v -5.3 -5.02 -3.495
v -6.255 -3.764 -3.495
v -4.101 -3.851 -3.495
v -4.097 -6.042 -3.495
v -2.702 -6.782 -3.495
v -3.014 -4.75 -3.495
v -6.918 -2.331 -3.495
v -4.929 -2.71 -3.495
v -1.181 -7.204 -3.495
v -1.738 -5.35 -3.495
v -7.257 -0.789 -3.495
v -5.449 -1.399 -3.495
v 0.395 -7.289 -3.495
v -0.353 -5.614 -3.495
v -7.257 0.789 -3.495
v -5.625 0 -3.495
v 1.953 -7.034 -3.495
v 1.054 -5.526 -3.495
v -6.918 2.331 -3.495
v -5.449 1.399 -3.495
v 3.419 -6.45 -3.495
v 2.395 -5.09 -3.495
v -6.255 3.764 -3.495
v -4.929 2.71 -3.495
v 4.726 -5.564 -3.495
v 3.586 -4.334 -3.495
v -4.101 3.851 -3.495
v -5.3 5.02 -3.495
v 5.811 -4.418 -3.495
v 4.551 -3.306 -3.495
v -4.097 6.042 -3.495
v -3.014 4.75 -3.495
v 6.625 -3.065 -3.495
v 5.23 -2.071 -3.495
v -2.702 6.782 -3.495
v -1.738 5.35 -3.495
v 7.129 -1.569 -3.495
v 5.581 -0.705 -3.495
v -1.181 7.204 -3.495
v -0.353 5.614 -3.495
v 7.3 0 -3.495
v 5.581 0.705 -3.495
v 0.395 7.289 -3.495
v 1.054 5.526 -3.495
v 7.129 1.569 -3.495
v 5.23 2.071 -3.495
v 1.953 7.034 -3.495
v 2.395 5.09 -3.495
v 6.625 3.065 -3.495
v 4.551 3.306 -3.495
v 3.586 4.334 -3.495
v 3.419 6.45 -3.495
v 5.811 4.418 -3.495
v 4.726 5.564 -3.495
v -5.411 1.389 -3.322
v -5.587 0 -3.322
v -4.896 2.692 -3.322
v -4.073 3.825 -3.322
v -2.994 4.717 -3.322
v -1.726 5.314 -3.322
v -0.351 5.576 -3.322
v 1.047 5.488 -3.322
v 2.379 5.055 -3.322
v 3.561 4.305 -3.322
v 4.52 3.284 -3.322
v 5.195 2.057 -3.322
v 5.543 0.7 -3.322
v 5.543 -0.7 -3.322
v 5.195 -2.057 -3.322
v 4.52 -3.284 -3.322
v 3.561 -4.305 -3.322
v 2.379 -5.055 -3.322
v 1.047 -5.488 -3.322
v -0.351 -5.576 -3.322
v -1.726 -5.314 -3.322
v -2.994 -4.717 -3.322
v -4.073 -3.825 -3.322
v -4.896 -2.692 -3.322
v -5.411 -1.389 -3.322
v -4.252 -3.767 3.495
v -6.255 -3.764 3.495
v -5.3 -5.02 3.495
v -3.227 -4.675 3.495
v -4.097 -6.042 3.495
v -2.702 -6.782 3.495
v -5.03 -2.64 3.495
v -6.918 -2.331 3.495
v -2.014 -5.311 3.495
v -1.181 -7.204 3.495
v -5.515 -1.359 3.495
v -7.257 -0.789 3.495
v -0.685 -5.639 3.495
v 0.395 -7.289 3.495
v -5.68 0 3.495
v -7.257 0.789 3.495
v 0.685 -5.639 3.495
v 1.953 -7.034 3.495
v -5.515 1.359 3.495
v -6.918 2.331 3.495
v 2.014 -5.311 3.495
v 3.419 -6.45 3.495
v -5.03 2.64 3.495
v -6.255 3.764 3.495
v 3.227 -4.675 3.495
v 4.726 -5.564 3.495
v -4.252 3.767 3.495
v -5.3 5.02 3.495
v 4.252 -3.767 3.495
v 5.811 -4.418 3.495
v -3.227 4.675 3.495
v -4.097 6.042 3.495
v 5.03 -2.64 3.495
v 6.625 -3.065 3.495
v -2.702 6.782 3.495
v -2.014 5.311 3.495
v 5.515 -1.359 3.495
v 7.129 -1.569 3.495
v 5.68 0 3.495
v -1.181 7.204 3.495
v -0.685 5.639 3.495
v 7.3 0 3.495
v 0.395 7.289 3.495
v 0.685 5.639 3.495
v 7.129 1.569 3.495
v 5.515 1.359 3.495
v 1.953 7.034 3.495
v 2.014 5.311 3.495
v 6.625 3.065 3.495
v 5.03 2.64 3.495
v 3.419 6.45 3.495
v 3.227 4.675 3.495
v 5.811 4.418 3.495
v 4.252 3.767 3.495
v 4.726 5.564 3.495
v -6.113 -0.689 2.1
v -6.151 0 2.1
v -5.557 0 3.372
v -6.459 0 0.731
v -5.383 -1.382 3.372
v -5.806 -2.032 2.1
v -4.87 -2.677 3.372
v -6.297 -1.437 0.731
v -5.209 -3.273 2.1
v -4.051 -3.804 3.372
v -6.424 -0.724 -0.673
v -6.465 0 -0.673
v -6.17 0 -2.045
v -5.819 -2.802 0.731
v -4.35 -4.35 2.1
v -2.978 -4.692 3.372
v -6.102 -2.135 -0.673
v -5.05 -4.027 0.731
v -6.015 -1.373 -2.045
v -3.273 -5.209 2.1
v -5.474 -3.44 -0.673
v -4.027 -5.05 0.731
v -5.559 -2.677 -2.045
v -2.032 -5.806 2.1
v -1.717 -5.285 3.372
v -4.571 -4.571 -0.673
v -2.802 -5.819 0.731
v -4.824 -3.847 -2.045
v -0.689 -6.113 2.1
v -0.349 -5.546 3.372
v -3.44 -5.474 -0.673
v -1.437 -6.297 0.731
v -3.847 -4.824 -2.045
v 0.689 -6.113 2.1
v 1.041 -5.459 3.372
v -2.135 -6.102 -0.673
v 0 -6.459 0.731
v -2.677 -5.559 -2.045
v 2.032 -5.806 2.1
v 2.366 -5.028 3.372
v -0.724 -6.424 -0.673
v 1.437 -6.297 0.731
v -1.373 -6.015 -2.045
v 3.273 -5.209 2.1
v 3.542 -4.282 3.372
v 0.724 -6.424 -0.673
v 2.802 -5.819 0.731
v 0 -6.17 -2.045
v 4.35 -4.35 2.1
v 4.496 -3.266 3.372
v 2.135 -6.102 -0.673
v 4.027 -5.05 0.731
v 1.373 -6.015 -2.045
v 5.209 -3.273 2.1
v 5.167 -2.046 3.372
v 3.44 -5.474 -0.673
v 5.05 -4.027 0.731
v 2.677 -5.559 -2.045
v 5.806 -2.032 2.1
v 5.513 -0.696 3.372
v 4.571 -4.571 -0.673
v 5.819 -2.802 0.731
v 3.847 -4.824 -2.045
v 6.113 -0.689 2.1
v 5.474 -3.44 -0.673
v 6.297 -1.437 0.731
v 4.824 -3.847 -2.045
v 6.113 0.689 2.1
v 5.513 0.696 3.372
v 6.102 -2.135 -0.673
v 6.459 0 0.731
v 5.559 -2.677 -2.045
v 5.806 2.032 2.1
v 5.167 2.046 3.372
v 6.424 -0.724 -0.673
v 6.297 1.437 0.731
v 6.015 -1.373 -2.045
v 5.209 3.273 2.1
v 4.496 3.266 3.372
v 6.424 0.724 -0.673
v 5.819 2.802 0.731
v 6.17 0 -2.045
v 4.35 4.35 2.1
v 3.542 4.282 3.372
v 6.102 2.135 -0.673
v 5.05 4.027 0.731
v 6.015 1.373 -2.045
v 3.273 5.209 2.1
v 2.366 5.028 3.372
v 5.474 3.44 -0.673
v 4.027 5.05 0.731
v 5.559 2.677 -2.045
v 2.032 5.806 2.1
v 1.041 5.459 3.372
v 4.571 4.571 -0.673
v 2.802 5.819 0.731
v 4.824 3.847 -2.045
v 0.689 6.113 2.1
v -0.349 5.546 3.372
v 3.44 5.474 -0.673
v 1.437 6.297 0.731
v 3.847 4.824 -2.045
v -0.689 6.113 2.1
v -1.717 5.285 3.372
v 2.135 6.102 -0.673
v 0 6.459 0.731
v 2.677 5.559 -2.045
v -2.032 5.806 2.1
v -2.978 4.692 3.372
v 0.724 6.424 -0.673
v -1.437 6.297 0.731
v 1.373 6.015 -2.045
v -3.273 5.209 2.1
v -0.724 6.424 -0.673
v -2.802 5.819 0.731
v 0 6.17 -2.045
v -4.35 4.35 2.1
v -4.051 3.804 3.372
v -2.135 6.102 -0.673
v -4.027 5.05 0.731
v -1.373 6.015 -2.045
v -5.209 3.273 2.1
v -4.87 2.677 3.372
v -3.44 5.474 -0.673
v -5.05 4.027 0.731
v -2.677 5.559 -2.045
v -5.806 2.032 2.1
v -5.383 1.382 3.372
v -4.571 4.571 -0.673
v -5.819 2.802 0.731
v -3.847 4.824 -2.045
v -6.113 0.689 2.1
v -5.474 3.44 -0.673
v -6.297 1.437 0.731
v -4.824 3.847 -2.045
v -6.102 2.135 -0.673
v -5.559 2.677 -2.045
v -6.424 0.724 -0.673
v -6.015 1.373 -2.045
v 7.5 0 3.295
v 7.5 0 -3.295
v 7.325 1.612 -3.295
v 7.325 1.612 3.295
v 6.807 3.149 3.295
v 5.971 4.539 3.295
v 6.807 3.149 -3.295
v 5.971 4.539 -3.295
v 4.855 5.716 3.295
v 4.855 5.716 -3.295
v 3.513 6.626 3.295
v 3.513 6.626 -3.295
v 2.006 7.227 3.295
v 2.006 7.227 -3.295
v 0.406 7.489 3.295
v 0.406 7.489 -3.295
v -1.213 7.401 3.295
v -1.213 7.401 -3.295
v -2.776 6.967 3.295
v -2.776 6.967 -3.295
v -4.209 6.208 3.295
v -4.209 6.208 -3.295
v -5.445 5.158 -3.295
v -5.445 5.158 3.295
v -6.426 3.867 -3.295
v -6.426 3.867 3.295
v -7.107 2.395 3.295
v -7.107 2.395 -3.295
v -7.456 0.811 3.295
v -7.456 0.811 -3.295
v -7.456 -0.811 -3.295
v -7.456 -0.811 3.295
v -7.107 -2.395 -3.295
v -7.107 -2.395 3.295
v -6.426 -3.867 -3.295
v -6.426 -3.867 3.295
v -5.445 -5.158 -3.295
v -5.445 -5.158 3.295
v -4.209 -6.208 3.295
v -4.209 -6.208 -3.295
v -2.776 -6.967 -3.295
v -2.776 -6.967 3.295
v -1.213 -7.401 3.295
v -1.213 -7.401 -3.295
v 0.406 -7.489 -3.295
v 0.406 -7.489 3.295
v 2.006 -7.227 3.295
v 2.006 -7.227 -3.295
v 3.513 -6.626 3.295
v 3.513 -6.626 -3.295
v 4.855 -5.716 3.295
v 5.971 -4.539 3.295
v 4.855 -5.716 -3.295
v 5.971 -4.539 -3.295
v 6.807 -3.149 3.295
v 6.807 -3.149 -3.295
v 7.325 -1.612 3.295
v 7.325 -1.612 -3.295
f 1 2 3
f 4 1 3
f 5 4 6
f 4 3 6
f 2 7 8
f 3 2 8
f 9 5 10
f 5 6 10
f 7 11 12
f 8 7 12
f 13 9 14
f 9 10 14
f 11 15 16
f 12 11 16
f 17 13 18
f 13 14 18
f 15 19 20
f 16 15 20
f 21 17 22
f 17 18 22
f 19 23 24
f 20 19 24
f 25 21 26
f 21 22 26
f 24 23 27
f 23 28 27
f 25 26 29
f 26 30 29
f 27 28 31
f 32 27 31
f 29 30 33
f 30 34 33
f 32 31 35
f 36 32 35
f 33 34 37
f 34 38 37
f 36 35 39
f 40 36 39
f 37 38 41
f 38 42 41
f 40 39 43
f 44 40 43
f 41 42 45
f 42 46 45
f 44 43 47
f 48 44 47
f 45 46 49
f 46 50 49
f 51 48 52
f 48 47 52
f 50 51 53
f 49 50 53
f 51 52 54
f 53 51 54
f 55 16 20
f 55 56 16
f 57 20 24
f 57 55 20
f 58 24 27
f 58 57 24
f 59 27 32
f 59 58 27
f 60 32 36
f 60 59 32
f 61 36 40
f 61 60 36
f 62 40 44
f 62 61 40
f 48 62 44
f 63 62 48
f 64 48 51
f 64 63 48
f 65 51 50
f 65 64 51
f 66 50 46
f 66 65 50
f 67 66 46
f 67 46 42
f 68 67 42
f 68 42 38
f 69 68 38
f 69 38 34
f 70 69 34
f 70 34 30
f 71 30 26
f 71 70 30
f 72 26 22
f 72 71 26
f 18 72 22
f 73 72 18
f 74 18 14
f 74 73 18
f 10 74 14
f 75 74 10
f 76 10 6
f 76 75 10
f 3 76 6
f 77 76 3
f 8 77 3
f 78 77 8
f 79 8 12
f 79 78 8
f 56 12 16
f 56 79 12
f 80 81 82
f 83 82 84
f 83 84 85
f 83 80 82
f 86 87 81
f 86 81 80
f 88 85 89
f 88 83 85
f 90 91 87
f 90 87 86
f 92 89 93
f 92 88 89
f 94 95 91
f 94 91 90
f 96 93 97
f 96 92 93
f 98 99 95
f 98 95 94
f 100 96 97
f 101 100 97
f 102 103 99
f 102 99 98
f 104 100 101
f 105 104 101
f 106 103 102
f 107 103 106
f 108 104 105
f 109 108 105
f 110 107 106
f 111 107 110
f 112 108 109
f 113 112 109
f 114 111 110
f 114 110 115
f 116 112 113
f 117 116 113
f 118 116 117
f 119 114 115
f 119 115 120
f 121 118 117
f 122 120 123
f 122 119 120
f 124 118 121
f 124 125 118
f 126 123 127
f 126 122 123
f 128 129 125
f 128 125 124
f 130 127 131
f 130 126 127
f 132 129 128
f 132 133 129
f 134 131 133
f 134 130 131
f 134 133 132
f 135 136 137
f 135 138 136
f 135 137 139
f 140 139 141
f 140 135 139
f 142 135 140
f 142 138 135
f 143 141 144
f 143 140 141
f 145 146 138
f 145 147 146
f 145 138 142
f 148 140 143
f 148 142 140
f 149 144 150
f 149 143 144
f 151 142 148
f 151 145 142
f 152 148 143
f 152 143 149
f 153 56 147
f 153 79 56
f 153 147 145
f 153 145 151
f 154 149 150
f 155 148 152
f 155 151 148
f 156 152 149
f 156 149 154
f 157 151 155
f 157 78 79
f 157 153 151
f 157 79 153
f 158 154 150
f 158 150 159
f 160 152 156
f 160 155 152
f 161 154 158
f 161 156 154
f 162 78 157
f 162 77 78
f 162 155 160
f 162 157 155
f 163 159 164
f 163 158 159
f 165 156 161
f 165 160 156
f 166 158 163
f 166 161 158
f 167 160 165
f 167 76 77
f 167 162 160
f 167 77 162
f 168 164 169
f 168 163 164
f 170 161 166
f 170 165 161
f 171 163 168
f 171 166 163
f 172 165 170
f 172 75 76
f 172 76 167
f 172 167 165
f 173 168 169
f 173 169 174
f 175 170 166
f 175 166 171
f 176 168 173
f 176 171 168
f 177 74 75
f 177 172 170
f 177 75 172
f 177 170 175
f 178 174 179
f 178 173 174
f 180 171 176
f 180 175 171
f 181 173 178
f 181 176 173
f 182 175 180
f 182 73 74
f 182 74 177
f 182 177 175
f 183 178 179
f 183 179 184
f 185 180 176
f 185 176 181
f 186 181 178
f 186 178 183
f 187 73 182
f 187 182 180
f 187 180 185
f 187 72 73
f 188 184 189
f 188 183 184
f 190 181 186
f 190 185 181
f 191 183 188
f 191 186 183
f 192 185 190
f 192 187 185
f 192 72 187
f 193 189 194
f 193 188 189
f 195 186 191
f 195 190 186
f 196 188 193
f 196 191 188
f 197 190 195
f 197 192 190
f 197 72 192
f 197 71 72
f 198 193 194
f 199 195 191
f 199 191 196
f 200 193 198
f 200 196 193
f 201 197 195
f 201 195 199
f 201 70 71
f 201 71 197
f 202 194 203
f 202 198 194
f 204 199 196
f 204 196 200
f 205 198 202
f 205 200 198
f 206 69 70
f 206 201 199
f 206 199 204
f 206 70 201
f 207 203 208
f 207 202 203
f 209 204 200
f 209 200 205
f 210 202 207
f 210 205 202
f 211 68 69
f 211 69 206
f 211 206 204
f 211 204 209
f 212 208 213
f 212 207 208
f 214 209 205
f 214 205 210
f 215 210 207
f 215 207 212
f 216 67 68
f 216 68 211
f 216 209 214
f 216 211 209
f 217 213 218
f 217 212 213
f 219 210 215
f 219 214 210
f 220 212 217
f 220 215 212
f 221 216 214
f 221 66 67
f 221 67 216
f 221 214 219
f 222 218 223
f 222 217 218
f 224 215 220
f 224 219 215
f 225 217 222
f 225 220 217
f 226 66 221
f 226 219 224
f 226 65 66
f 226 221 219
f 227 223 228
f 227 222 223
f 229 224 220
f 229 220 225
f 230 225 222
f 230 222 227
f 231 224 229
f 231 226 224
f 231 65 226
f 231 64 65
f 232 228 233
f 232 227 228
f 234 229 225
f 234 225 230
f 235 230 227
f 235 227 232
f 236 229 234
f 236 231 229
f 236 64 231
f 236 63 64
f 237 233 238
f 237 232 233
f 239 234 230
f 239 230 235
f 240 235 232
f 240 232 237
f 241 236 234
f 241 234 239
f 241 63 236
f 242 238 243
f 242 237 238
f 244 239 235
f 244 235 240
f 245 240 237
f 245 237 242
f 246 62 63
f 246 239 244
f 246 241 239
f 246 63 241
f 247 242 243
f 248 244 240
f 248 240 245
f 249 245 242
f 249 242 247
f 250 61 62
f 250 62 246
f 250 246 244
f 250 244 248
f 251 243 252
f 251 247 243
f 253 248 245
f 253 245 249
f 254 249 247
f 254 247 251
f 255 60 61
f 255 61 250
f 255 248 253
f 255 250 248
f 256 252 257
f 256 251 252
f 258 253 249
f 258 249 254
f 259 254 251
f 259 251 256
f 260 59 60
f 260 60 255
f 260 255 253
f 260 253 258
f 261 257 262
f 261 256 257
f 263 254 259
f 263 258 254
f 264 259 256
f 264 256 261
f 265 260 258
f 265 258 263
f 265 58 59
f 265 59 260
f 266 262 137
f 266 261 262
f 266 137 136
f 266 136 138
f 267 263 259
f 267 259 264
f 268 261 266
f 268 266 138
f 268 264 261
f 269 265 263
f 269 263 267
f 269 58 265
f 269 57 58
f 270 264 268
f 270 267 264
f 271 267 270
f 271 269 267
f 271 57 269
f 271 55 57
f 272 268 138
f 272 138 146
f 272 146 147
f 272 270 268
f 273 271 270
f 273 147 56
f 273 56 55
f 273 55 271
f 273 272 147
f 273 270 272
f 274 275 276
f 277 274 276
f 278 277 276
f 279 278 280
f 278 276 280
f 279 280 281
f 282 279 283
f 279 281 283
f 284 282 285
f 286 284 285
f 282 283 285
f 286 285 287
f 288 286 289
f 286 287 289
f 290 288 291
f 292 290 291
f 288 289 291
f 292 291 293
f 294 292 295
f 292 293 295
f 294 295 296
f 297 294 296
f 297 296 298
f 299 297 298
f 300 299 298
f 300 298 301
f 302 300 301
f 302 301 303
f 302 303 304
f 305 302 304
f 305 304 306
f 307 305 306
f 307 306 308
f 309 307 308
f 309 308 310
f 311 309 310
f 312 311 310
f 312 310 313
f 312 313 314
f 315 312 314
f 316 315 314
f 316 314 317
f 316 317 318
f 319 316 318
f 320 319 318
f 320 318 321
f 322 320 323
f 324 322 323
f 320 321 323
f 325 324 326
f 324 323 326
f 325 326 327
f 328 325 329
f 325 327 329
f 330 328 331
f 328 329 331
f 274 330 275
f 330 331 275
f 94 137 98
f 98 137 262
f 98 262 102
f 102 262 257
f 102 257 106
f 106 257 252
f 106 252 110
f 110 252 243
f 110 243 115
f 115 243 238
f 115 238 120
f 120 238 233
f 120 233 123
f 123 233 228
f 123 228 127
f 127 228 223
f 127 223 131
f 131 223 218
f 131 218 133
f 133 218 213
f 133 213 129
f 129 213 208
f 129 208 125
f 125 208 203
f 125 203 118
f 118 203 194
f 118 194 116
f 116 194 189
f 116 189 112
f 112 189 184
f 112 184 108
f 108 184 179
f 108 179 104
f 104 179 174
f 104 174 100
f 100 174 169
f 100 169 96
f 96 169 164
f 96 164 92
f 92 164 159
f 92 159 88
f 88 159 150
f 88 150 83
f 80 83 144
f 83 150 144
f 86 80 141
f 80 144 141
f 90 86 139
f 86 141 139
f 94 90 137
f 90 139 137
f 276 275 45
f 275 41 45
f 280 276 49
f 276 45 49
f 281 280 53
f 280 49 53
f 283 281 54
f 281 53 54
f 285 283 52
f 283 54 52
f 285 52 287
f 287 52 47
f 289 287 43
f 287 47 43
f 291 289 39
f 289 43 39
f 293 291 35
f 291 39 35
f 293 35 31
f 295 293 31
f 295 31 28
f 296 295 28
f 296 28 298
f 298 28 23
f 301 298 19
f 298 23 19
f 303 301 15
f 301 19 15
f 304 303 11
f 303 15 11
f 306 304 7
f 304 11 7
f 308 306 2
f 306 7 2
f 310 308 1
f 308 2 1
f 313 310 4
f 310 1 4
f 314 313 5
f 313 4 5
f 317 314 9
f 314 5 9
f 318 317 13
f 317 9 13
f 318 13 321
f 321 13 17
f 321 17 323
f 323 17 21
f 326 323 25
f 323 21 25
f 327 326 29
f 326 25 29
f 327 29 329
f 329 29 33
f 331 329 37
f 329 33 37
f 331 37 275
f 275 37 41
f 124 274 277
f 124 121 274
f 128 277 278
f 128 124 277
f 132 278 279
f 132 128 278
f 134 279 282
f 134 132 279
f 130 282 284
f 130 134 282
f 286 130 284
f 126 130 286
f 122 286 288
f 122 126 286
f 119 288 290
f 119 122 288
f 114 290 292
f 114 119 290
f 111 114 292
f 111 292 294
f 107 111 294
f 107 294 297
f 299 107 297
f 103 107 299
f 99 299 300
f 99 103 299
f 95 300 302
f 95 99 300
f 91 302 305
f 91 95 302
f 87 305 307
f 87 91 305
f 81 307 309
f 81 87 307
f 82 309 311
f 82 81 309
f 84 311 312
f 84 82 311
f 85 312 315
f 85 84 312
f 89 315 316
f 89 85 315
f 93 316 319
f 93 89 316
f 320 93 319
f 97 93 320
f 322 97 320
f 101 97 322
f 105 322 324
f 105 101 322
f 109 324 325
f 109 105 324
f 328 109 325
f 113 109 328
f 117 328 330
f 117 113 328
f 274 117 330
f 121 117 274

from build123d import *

# Parameters (mm, degrees)
ESTRUSIONE1_DEPTH      = 3.495
ESTRUSIONE1_DEPTH_BACK = 3.495
SCHIZZO1_R             = 7.5
SMUSSO1_SIZE           = 0.2
SMUSSO1_SIZE_2         = 0.14484006


with BuildPart() as part:
    # Schizzo1 → Estrusione1 (new, two sides: drawn at the far end of the back side and taken through both)
    with BuildSketch(Plane.XY.offset(-ESTRUSIONE1_DEPTH_BACK)):
        Circle(SCHIZZO1_R)
    extrude(amount=ESTRUSIONE1_DEPTH + ESTRUSIONE1_DEPTH_BACK)

    # Schizzo2 → Taglia-Rivoluzione1 (revolve, cut)
    with BuildSketch(Plane(origin=(0, 0, 0), x_dir=(1, 0, 0), z_dir=(0, 1, 0))):
        with BuildLine():
            Line((0, 6.5), (0, -6.5))
            ThreePointArc((0, -6.5), (-6.5, 0), (0, 6.5))
        make_face()
    revolve(axis=Axis((0, 0, -4.815448708), (0, 0, 1)), mode=Mode.SUBTRACT)

    # Smusso1
    # the kernel refuses this chamfer: 0.2, 0.14484006 mm, written as the material it takes off along each edge
    with BuildSketch(Plane(origin=(0, 0, -3.495), x_dir=(1, 0, 0), z_dir=(0, -1, 0))) as smusso1_piece_1:
        Polygon((7.5, SMUSSO1_SIZE), (7.5 - SMUSSO1_SIZE, 0), (7.5, 0), align=None)
    revolve(axis=Axis((0, 0, -3.495), (0, 0, 1)), mode=Mode.SUBTRACT)
    with BuildSketch(Plane(origin=(0, 0, 3.495), x_dir=(1, 0, 0), z_dir=(0, -1, 0))) as smusso1_piece_2:
        Polygon((7.5, -SMUSSO1_SIZE), (7.5 - SMUSSO1_SIZE, 0), (7.5, 0), align=None)
    revolve(axis=Axis((0, 0, 3.495), (0, 0, 1)), mode=Mode.SUBTRACT)
    with BuildSketch(Plane(origin=(0, 0, 3.495), x_dir=(-1, 0, 0), z_dir=(0, -1, 0))) as smusso1_piece_3:
        with BuildLine():
            Line((5.480417411 + SMUSSO1_SIZE, 0), (5.557122182, 0.12329523))
            ThreePointArc((5.557122182, 0.12329523), (5.519593752, 0.062204519), (5.480417411, 0))
            Line((5.480417411, 0), (5.480417411 + SMUSSO1_SIZE, 0))
        make_face()
    revolve(axis=Axis((0, 0, 3.495), (0, 0, -1)), mode=Mode.SUBTRACT)
    with BuildSketch(Plane(origin=(0, 0, -3.495), x_dir=(-1, 0, 0), z_dir=(0, -1, 0))) as smusso1_piece_4:
        with BuildLine():
            Line((5.480417411 + SMUSSO1_SIZE_2 * 1.00000000281, 0), (5.586985705, -0.173014037))
            ThreePointArc((5.586985705, -0.173014037), (5.535884344, -0.088537827), (5.480417411, 0))
            Line((5.480417411, 0), (5.480417411 + SMUSSO1_SIZE_2 * 1.00000000281, 0))
        make_face()
    revolve(axis=Axis((0, 0, -3.495), (0, 0, -1)), mode=Mode.SUBTRACT)


solid = part.part
